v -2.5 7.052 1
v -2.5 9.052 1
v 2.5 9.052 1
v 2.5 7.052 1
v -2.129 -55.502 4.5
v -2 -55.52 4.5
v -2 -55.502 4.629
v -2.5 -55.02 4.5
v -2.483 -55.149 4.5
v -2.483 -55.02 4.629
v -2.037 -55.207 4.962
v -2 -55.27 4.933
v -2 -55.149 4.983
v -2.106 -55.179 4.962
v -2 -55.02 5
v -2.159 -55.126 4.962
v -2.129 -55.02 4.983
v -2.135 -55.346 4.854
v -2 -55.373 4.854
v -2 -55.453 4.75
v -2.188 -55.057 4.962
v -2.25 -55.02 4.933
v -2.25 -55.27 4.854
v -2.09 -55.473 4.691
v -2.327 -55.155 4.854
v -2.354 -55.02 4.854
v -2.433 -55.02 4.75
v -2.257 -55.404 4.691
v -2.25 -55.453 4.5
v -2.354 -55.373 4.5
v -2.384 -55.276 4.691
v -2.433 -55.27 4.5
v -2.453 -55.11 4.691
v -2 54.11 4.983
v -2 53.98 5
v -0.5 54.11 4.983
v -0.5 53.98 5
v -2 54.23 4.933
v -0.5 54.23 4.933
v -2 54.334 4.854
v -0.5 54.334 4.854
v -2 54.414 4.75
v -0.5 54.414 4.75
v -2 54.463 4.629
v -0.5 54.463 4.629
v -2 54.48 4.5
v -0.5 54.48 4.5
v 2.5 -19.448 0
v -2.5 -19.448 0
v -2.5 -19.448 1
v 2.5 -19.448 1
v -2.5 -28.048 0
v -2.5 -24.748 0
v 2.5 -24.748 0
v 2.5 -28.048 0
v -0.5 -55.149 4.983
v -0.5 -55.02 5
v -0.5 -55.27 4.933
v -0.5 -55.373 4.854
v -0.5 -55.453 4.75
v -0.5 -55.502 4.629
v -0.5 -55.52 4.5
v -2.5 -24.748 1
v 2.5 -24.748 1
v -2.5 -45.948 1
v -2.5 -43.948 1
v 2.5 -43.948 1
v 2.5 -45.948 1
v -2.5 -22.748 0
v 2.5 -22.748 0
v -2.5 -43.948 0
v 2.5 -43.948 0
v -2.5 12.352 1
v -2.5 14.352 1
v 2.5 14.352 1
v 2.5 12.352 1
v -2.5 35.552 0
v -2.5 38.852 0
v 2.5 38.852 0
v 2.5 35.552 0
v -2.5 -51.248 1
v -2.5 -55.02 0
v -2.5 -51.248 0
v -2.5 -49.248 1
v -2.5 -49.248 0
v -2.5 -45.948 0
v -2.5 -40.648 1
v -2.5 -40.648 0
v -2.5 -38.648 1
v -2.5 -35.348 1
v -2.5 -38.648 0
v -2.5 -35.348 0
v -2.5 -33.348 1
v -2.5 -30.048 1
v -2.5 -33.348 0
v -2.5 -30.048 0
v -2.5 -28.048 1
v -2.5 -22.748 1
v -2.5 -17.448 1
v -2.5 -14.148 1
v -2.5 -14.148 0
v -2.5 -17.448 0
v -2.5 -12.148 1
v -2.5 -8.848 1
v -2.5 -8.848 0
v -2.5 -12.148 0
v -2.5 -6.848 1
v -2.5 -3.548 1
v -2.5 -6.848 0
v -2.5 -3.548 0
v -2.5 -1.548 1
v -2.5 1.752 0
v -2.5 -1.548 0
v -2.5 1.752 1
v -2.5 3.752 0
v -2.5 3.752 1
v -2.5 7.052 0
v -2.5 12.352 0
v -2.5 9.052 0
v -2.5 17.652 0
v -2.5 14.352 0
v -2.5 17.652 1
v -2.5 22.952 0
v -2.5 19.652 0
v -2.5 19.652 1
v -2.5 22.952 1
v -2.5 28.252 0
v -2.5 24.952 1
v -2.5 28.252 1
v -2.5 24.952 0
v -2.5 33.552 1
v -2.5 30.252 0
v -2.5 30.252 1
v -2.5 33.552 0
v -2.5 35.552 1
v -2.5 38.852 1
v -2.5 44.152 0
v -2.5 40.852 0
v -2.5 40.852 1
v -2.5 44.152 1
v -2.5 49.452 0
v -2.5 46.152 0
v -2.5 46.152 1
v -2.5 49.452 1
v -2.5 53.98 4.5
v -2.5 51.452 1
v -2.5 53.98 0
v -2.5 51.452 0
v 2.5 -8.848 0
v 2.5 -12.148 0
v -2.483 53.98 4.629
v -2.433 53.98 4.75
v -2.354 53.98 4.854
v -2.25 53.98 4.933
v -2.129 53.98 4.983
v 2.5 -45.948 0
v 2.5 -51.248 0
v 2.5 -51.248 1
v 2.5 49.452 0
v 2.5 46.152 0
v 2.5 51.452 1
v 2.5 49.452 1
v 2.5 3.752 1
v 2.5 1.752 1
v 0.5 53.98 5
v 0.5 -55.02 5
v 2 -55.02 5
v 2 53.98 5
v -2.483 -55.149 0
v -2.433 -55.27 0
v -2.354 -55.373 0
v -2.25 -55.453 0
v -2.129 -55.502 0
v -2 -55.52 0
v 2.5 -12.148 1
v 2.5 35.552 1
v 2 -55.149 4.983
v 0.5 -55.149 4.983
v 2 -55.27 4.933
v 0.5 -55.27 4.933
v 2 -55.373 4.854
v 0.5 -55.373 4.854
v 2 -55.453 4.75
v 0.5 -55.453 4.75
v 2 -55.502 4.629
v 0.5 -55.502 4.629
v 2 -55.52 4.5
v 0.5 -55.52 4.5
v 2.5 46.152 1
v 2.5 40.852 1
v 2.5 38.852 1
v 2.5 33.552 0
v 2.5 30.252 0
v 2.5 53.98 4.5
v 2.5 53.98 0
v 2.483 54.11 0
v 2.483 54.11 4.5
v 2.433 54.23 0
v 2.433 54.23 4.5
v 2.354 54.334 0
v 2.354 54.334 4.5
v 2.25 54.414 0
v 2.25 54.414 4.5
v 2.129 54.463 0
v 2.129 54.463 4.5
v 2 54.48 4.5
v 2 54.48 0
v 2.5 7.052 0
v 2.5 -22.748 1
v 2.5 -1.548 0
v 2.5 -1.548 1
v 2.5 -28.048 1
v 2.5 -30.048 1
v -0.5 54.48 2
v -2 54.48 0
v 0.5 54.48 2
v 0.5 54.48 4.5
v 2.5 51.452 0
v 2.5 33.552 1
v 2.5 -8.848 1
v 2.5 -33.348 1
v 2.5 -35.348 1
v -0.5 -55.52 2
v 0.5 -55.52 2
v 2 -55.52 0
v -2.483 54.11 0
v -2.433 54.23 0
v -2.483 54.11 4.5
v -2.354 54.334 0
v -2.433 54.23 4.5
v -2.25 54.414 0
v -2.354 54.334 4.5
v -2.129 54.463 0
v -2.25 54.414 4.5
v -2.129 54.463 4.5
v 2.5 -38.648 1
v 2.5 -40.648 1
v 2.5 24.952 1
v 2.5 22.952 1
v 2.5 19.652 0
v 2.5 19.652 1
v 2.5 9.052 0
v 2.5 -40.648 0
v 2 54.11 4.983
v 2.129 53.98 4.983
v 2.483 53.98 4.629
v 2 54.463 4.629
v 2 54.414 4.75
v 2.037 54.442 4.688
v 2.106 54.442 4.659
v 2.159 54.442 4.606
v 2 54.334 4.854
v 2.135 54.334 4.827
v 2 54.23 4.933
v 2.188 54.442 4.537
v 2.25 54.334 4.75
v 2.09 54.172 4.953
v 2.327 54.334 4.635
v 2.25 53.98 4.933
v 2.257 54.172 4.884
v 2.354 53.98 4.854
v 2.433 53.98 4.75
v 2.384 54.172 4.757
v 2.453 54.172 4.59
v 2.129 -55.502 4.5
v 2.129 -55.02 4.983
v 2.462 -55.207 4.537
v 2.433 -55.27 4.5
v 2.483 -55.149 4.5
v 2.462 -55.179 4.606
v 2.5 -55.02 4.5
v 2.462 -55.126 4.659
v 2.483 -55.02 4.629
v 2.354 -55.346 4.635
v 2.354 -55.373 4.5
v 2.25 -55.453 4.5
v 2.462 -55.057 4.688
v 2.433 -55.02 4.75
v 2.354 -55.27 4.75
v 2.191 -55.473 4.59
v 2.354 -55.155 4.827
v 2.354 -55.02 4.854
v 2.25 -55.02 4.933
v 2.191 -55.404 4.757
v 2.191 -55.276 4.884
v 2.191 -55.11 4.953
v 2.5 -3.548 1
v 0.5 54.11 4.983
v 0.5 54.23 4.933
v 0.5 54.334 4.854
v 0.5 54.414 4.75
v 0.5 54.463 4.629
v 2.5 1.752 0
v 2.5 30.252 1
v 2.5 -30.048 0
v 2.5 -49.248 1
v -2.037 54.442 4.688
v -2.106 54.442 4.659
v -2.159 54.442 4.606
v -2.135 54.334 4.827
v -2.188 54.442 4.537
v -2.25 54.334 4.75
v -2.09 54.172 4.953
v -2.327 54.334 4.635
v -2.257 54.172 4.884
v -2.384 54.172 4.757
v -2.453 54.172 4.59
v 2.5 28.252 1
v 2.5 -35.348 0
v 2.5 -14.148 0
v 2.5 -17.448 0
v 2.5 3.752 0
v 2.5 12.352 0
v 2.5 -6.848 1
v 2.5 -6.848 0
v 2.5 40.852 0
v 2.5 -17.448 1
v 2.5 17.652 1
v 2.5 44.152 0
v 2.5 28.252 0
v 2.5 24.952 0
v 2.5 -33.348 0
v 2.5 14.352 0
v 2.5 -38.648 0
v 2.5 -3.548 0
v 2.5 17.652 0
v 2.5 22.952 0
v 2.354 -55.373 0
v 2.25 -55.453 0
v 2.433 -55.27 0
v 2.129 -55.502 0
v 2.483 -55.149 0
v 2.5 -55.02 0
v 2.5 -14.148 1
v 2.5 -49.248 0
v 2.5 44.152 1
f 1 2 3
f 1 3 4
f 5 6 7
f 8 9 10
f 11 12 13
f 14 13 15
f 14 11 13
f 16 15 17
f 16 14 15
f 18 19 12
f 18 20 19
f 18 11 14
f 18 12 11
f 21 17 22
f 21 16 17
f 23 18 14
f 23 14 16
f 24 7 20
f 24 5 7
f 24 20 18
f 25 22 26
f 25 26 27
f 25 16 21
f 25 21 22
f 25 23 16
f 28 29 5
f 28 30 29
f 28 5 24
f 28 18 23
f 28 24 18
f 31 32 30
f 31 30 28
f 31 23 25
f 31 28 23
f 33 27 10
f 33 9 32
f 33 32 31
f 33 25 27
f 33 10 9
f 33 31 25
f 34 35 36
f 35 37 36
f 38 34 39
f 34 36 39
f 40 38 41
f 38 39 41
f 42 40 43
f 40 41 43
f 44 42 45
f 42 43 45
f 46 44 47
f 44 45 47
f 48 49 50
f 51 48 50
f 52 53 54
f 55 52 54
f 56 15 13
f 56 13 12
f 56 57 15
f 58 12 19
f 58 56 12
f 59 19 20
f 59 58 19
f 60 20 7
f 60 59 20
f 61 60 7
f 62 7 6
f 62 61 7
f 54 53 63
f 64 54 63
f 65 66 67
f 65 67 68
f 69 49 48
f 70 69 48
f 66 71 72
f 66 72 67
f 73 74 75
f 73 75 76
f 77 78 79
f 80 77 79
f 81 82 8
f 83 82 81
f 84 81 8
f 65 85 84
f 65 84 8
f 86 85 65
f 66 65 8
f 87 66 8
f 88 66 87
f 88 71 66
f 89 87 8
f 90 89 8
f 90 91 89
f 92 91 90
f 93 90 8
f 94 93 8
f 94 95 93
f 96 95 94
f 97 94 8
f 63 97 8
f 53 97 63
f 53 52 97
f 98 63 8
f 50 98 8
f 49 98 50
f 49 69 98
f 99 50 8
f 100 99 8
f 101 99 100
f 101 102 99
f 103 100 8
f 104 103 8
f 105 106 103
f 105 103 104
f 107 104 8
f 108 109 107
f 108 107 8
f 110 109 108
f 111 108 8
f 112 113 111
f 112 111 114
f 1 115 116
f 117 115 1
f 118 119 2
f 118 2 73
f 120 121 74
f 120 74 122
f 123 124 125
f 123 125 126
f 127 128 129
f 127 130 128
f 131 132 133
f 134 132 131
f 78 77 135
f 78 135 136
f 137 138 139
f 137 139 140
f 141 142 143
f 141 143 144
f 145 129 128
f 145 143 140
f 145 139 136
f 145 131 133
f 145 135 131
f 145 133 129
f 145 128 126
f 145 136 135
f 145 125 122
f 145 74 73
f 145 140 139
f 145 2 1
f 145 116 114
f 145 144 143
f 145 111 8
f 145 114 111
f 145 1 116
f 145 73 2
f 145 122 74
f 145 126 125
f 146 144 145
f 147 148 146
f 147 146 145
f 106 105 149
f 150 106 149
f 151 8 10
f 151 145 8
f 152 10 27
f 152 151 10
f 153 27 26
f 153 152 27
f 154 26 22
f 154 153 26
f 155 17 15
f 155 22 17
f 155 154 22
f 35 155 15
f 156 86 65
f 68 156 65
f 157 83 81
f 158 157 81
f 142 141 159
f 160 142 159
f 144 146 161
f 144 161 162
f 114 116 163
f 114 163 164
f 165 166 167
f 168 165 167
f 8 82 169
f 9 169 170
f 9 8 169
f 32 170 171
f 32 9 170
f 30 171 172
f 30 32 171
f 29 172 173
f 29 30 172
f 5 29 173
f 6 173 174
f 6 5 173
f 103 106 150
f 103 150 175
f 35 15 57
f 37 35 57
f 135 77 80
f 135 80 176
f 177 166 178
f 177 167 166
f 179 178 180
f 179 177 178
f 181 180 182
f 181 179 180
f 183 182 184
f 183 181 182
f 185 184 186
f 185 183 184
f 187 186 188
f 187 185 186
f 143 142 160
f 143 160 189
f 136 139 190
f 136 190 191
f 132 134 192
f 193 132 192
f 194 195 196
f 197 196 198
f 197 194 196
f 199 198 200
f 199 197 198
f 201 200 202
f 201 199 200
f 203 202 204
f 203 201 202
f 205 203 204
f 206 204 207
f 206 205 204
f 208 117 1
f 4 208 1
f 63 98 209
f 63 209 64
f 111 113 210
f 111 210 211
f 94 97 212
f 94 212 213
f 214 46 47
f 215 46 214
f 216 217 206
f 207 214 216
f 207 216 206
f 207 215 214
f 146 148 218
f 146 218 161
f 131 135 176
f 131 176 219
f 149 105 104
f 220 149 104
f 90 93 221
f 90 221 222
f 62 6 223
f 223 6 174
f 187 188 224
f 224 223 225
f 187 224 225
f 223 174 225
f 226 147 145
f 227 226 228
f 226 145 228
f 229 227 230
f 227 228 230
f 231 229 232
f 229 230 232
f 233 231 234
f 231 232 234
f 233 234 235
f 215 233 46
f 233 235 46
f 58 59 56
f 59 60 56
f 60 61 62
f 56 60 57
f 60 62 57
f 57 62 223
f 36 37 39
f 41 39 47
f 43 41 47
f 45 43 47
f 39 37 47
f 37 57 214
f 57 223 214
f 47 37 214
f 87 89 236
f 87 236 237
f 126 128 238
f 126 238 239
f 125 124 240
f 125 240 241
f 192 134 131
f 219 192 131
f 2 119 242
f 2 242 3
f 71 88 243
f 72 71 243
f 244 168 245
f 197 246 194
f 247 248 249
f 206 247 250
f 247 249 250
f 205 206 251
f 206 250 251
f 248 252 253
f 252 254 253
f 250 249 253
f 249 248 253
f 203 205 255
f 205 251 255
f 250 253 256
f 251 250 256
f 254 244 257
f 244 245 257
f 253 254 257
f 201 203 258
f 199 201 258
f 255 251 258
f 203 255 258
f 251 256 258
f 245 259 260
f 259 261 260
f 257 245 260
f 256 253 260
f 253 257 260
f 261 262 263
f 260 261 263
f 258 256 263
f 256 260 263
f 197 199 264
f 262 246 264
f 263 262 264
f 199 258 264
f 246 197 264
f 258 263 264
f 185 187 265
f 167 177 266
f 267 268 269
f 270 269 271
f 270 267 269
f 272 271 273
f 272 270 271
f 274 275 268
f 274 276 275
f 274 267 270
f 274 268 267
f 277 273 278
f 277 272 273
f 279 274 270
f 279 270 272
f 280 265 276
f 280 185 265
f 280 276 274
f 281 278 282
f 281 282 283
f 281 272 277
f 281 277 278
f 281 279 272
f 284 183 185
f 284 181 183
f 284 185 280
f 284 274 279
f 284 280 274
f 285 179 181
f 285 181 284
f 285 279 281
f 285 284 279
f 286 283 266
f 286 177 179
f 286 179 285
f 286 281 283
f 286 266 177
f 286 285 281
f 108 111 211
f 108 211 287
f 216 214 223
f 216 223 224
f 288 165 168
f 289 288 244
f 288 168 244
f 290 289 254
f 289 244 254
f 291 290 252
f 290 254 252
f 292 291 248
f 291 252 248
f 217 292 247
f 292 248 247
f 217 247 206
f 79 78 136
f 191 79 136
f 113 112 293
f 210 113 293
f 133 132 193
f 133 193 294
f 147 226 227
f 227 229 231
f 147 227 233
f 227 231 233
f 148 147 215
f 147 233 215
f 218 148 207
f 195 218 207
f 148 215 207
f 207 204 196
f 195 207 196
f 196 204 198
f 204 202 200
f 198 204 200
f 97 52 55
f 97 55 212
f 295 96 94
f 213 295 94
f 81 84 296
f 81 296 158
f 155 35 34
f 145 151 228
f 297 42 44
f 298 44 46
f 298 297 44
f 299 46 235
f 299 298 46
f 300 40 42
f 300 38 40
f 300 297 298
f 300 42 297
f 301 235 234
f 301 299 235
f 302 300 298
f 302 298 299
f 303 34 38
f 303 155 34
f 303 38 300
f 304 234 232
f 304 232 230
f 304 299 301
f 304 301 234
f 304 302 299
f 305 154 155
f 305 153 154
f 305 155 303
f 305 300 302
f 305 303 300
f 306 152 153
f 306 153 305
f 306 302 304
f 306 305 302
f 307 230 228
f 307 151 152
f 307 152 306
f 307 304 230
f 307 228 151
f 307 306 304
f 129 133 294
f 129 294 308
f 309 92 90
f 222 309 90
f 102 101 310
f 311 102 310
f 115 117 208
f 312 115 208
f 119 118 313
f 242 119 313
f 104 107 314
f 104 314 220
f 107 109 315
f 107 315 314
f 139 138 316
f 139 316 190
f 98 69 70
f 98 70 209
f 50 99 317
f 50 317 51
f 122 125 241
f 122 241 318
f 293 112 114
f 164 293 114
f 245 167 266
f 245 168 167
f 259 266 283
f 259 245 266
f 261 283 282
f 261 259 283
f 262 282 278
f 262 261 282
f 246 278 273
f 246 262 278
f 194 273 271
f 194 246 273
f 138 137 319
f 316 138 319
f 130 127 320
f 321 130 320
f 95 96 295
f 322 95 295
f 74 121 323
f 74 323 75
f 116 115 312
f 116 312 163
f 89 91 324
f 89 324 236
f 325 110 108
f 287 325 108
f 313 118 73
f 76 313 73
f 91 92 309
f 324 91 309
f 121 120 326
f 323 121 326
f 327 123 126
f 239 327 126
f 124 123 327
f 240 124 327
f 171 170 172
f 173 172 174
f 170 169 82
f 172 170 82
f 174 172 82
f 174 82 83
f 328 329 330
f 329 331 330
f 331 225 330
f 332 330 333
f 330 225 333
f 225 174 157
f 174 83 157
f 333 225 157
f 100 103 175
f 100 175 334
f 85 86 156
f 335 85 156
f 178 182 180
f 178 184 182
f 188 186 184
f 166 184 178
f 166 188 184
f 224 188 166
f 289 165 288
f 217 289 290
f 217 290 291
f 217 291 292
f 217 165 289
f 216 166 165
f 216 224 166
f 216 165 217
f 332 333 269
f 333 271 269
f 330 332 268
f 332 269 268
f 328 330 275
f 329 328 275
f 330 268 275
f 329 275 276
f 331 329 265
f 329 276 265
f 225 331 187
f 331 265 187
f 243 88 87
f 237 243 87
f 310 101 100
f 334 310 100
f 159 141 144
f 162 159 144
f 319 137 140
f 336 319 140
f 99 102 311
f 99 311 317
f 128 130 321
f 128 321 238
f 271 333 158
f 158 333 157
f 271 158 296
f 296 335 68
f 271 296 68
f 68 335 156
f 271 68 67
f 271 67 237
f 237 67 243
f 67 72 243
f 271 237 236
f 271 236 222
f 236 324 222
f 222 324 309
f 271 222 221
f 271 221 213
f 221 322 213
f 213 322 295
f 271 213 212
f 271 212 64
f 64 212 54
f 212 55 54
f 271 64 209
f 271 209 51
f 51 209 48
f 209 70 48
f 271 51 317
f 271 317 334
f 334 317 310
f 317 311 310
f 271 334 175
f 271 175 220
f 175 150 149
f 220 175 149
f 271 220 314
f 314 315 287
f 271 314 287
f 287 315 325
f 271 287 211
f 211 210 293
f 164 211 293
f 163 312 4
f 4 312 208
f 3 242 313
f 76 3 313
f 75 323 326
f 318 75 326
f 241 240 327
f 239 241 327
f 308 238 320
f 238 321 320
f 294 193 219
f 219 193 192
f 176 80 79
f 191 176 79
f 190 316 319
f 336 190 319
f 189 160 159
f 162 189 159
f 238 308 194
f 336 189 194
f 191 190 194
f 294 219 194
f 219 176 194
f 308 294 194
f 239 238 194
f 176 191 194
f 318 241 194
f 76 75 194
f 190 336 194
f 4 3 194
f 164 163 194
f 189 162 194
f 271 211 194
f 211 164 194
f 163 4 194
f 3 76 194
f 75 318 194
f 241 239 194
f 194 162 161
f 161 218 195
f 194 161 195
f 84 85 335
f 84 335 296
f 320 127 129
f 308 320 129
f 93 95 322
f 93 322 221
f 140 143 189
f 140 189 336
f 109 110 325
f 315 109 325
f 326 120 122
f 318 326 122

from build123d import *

# Parameters (mm, degrees)
F0_W     = 0.5
F0_H     = 110
F1_DEPTH = 2
F0_W_2   = 2
F2_DEPTH = 5
F3_R     = 0.5
F4_W     = 2
F4_H     = 1
F5_DEPTH = 28.67605


with BuildPart() as f1:
    # F0 (on Top) → F1 (new body)
    with BuildSketch(Plane.XY):
        with Locations((-0.25, -0.5195)):
            Rectangle(F0_W, F0_H)
        with Locations((0.25, -0.5195)):
            Rectangle(F0_W, F0_H)
    extrude(amount=F1_DEPTH)

    # F0 (on Top) → F2 (join)
    with BuildSketch(Plane.XY):
        with Locations((-1.5, -0.5195)):
            Rectangle(F0_W_2, F0_H)
        with Locations((1.5, -0.5195)):
            Rectangle(F0_W_2, F0_H)
    extrude(amount=F2_DEPTH)

    # F3
    f3_edges = [f1.edges().sort_by_distance(p)[0] for p in [
        (-2.5, -55.5195, 2.5),
        (-1.5, -55.5195, 5),
        (1.5, -55.5195, 5),
        (2.5, -55.5195, 2.5),
        (2.5, -0.5195, 5),
        (-2.5, -0.5195, 5),
        (-1.5, 54.4805, 5),
        (1.5, 54.4805, 5),
        (2.5, 54.4805, 2.5),
        (-2.5, 54.4805, 2.5),
    ]]
    fillet(f3_edges, radius=F3_R)

    # F4 (on face) → F5 (cut)
    with BuildSketch(Plane(origin=(-2.5, 0, 0), x_dir=(0, -1, 0), z_dir=(-1, 0, 0))):
        with Locations((-50.451858, 0.5)):
            Rectangle(F4_W, F4_H)
        with Locations((-45.151858, 0.5)):
            Rectangle(F4_W, F4_H)
        with Locations((-39.851858, 0.5)):
            Rectangle(F4_W, F4_H)
        with Locations((-34.551858, 0.5)):
            Rectangle(F4_W, F4_H)
        with Locations((-29.251858, 0.5)):
            Rectangle(F4_W, F4_H)
        with Locations((-23.951858, 0.5)):
            Rectangle(F4_W, F4_H)
        with Locations((-18.651858, 0.5)):
            Rectangle(F4_W, F4_H)
        with Locations((-13.351858, 0.5)):
            Rectangle(F4_W, F4_H)
        with Locations((-8.051858, 0.5)):
            Rectangle(F4_W, F4_H)
        with Locations((-2.751858, 0.5)):
            Rectangle(F4_W, F4_H)
        with Locations((2.548142, 0.5)):
            Rectangle(F4_W, F4_H)
        with Locations((7.848142, 0.5)):
            Rectangle(F4_W, F4_H)
        with Locations((13.148142, 0.5)):
            Rectangle(F4_W, F4_H)
        with Locations((18.448142, 0.5)):
            Rectangle(F4_W, F4_H)
        with Locations((23.748142, 0.5)):
            Rectangle(F4_W, F4_H)
        with Locations((29.048142, 0.5)):
            Rectangle(F4_W, F4_H)
        with Locations((34.348142, 0.5)):
            Rectangle(F4_W, F4_H)
        with Locations((39.648142, 0.5)):
            Rectangle(F4_W, F4_H)
        with Locations((44.948142, 0.5)):
            Rectangle(F4_W, F4_H)
        with Locations((50.248142, 0.5)):
            Rectangle(F4_W, F4_H)
    extrude(amount=-F5_DEPTH, mode=Mode.SUBTRACT)


solid = f1.part
